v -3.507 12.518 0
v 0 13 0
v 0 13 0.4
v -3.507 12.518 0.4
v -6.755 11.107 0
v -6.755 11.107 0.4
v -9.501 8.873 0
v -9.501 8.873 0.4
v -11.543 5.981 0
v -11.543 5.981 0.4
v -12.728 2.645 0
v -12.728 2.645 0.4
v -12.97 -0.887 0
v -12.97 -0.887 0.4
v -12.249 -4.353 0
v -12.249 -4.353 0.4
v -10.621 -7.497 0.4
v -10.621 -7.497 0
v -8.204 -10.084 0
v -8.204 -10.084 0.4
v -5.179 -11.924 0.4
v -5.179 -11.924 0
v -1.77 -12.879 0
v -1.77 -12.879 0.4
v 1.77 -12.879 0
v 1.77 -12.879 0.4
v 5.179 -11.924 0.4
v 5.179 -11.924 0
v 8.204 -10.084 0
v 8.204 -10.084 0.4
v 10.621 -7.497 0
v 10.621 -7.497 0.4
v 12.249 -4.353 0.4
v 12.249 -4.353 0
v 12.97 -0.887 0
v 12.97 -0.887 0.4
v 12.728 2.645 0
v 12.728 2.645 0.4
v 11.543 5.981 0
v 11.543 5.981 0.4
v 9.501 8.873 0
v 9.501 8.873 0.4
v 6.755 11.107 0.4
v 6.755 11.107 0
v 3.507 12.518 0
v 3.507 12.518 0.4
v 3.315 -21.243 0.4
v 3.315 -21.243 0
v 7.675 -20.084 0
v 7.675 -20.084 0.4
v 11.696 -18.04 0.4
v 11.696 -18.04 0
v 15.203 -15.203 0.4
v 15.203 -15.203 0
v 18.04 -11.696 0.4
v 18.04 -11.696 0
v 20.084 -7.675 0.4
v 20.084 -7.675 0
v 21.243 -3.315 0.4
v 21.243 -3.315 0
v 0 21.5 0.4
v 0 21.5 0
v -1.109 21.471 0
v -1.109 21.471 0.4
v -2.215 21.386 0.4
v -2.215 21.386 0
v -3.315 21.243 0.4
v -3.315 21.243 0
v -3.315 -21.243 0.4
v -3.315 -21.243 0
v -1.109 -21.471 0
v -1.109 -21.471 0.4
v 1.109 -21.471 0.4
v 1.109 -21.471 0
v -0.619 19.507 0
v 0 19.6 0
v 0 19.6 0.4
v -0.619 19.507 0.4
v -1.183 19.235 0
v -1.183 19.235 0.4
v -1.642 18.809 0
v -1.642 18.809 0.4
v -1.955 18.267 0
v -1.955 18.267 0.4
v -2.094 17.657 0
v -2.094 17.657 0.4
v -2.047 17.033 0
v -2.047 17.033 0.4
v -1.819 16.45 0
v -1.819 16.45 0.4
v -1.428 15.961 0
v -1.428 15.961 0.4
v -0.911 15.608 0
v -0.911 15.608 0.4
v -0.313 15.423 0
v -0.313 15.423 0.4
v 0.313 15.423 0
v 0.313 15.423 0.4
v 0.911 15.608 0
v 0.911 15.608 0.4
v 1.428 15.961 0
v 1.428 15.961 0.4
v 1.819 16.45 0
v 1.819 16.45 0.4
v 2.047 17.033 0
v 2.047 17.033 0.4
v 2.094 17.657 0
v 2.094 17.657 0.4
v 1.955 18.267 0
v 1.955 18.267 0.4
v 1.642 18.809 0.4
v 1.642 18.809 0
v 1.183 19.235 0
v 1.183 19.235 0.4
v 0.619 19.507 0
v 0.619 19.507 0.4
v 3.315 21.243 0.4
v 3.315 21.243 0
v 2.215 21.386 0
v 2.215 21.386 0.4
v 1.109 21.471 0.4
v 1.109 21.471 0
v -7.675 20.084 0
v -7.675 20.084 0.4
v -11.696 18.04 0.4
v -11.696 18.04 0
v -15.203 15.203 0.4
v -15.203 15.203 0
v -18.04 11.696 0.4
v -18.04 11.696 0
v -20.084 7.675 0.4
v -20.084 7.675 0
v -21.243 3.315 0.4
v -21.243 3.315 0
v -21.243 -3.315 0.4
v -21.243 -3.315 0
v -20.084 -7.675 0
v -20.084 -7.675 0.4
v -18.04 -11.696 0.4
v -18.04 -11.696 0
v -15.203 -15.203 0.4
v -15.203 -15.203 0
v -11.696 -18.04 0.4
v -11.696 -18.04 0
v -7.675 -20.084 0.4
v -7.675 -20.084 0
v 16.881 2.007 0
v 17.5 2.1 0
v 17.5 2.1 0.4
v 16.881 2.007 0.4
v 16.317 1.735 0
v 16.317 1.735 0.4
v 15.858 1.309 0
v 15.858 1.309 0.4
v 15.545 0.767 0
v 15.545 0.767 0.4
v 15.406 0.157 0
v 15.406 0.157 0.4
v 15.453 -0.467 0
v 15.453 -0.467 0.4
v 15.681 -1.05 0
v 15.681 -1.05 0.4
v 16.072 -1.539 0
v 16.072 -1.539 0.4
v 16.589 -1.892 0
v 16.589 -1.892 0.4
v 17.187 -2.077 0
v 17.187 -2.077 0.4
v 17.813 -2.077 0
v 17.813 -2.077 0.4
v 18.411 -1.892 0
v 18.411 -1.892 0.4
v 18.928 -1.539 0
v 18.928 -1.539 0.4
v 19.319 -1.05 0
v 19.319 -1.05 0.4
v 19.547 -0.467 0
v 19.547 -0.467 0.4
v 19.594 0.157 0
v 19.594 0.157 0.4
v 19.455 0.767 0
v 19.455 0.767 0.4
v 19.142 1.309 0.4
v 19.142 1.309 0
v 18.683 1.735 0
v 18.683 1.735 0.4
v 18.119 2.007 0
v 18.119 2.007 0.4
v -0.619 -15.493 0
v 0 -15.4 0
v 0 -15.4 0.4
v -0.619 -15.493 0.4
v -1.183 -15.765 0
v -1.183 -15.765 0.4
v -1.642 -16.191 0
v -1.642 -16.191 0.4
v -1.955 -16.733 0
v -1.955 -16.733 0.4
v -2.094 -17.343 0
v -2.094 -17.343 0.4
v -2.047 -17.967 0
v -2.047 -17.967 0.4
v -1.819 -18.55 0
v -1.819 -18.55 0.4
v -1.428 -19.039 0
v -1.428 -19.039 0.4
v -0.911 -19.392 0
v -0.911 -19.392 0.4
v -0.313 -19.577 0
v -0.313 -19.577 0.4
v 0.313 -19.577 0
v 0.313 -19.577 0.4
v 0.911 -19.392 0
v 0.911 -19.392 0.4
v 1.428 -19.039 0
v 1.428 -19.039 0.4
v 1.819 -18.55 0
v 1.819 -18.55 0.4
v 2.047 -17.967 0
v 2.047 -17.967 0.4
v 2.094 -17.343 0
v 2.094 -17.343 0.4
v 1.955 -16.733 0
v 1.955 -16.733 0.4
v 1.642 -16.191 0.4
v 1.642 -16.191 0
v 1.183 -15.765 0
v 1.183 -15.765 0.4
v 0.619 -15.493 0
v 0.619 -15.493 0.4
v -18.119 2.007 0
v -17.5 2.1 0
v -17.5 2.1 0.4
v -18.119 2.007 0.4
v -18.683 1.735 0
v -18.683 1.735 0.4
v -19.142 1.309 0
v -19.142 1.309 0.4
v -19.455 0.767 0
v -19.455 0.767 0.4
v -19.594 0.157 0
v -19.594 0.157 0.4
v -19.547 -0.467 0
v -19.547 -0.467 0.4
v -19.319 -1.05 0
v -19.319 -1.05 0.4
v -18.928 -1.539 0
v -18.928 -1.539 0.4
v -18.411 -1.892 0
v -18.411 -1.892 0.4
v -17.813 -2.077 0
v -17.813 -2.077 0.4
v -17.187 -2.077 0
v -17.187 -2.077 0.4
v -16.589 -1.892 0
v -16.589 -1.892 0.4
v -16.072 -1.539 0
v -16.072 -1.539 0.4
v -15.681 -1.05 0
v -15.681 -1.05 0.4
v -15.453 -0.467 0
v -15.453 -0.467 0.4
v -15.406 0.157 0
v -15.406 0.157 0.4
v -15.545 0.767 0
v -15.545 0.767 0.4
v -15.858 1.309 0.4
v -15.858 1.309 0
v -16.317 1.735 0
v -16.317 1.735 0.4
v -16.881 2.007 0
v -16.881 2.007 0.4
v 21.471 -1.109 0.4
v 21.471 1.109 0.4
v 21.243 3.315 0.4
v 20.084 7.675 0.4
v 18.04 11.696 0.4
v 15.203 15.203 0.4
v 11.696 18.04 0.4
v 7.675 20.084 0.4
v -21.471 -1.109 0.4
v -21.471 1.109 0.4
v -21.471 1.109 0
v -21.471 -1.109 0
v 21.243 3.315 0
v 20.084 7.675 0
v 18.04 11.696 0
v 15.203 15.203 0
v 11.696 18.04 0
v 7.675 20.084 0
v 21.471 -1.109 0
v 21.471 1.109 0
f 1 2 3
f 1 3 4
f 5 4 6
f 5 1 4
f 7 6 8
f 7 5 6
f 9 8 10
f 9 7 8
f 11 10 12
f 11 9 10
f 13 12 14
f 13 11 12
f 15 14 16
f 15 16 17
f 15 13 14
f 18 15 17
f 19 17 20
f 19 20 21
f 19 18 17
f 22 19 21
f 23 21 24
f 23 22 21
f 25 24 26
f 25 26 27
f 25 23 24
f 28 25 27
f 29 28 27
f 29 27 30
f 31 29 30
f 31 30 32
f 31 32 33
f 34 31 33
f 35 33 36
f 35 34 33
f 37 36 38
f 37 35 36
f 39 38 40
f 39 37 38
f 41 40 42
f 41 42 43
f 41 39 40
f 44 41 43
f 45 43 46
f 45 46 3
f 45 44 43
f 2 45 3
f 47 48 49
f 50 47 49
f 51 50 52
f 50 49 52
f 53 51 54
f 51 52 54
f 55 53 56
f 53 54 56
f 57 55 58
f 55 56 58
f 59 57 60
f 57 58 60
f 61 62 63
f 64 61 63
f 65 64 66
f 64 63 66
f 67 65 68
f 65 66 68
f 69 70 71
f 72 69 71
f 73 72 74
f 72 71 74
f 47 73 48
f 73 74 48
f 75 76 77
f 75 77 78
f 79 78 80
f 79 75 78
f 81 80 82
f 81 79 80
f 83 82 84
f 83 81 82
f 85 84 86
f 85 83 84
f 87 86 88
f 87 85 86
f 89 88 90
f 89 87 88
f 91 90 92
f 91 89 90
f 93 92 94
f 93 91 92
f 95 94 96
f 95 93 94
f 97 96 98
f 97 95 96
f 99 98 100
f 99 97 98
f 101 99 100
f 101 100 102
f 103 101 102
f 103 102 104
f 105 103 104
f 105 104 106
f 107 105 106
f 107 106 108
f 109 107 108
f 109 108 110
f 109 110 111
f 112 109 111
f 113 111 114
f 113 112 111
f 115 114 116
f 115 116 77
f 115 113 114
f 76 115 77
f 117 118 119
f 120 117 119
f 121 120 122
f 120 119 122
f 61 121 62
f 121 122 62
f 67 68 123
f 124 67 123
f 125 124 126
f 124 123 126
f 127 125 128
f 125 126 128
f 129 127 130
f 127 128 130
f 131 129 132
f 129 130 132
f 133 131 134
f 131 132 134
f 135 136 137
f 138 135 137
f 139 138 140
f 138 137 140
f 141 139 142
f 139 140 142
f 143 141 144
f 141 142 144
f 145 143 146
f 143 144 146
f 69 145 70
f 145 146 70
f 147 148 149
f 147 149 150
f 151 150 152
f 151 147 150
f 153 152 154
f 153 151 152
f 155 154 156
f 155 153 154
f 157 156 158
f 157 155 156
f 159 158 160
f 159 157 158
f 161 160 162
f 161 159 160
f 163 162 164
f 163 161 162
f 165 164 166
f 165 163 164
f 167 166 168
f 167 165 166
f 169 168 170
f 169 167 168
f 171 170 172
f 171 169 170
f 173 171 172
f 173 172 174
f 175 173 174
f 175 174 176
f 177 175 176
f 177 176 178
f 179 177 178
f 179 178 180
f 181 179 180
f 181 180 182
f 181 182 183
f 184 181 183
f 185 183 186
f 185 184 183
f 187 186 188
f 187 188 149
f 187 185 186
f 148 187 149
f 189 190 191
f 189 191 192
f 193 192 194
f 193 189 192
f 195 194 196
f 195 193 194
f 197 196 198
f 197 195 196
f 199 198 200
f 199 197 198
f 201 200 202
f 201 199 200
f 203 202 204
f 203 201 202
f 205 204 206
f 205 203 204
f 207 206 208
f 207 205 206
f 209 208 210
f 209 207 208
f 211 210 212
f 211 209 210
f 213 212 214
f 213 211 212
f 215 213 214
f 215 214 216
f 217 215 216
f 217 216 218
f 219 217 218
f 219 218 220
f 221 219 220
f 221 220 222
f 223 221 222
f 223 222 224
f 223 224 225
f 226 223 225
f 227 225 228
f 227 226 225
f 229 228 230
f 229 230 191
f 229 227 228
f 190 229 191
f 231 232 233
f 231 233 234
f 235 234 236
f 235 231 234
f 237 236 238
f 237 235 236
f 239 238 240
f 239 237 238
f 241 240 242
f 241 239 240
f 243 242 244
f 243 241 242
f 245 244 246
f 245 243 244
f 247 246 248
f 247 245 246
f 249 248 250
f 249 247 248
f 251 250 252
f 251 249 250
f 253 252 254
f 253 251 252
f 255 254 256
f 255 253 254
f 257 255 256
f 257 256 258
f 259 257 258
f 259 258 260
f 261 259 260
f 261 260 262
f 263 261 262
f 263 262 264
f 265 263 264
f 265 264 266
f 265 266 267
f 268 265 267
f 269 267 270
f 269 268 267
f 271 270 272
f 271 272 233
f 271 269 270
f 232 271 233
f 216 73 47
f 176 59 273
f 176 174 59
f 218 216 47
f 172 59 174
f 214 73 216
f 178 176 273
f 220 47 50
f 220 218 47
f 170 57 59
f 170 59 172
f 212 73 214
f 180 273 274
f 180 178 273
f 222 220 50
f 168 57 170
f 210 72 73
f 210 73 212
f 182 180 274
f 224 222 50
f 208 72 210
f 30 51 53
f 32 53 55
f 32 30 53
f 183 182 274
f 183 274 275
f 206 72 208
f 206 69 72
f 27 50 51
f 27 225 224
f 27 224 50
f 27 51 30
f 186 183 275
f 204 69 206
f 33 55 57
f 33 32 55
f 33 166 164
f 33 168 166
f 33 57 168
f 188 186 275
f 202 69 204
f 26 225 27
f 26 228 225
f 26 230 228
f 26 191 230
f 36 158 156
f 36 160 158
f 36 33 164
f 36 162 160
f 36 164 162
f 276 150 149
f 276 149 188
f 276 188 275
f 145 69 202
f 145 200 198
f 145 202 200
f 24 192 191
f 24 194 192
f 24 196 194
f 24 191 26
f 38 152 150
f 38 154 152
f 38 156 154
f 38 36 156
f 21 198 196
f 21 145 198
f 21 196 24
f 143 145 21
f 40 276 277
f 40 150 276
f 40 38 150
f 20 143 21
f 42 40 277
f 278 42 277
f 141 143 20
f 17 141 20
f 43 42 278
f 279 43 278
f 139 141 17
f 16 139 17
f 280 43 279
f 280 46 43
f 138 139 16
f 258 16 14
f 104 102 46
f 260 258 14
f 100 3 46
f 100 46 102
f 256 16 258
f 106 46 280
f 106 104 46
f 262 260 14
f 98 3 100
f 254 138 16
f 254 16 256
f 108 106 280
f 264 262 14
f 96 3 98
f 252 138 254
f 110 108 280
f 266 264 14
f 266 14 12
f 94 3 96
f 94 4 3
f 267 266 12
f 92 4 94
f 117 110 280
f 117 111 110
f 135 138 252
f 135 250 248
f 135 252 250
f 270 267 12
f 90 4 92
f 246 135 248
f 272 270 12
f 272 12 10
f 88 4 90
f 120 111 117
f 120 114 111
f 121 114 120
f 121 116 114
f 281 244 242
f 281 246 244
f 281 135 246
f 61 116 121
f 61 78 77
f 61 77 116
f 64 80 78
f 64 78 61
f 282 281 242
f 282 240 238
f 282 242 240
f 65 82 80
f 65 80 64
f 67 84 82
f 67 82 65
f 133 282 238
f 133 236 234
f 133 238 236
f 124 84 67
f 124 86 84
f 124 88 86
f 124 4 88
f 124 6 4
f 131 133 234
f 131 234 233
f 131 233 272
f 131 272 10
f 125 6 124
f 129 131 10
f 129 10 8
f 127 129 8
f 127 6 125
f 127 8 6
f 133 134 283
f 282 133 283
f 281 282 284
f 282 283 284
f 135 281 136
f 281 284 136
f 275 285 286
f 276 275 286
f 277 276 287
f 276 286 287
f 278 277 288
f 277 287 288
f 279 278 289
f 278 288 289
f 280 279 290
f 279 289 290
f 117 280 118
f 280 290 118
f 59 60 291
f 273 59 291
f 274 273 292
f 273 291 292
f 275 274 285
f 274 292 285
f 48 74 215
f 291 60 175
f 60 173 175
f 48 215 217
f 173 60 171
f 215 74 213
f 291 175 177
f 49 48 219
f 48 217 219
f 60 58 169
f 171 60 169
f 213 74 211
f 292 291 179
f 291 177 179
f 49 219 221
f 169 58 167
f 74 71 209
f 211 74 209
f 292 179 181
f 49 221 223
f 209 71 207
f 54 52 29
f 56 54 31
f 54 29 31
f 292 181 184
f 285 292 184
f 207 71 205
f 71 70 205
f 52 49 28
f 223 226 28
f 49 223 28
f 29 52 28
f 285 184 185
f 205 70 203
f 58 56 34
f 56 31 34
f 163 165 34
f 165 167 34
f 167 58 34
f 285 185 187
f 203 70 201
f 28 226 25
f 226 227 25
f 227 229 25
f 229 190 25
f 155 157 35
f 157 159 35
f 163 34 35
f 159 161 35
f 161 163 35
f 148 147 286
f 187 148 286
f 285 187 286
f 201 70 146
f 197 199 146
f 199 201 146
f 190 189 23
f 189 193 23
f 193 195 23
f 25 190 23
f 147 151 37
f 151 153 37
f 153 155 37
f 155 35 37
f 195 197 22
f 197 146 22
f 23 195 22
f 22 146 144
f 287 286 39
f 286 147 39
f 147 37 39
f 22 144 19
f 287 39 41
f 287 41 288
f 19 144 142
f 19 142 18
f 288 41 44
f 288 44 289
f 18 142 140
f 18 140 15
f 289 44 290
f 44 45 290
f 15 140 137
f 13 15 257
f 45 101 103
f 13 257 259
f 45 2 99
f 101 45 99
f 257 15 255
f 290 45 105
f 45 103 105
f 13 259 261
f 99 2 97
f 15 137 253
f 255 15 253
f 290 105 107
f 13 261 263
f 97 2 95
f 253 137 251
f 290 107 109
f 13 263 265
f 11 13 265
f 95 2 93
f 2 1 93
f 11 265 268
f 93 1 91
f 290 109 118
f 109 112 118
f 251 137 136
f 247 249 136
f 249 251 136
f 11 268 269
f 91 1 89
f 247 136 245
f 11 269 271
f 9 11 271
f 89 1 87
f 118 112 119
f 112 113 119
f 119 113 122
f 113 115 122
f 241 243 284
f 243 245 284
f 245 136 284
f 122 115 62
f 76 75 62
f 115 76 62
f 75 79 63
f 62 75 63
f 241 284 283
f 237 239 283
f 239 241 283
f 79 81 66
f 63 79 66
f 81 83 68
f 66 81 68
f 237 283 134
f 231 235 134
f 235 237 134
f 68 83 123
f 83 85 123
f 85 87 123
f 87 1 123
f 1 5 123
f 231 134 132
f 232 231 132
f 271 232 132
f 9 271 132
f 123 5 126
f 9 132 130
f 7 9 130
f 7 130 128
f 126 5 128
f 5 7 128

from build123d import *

# Parameters (mm, degrees)
SKETCH1_R           = 2.1
SKETCH1_R_2         = 13
BOSS_EXTRUDE1_DEPTH = 0.4
BOSS_EXTRUDE2_DEPTH = 0.4


with BuildPart() as part:
    # Sketch1 → Boss-Extrude1 (new body)
    with BuildSketch(Plane(origin=(0, 0, 0), x_dir=(0, 1, 0), z_dir=(0, 0, 1))):
        with BuildLine():
            ThreePointArc((21.242857143, -3.31527079), (21.435617889, -1.662614121), (21.5, 0))
            ThreePointArc((21.5, 0), (21.435617889, 1.662614121), (21.242857143, 3.31527079))
            ThreePointArc((21.242857143, 3.31527079), (19.220493395, 4.694667451), (16.785714286, 4.948716593))
            ThreePointArc((16.785714286, 4.948716593), (12.374368671, 12.374368671), (4.948716593, 16.785714286))
            ThreePointArc((4.948716593, 16.785714286), (4.694667451, 19.220493395), (3.31527079, 21.242857143))
            ThreePointArc((3.31527079, 21.242857143), (0, 21.5), (-3.31527079, 21.242857143))
            ThreePointArc((-3.31527079, 21.242857143), (-4.694667451, 19.220493395), (-4.948716593, 16.785714286))
            ThreePointArc((-4.948716593, 16.785714286), (-12.374368671, 12.374368671), (-16.785714286, 4.948716593))
            ThreePointArc((-16.785714286, 4.948716593), (-19.220493395, 4.694667451), (-21.242857143, 3.31527079))
            ThreePointArc((-21.242857143, 3.31527079), (-21.5, 0), (-21.242857143, -3.31527079))
            ThreePointArc((-21.242857143, -3.31527079), (-19.220493395, -4.694667451), (-16.785714286, -4.948716593))
            ThreePointArc((-16.785714286, -4.948716593), (-12.374368671, -12.374368671), (-4.948716593, -16.785714286))
            ThreePointArc((-4.948716593, -16.785714286), (-4.694667451, -19.220493395), (-3.31527079, -21.242857143))
            ThreePointArc((-3.31527079, -21.242857143), (0, -21.5), (3.31527079, -21.242857143))
            ThreePointArc((3.31527079, -21.242857143), (4.694667451, -19.220493395), (4.948716593, -16.785714286))
            ThreePointArc((4.948716593, -16.785714286), (12.374368671, -12.374368671), (16.785714286, -4.948716593))
            ThreePointArc((16.785714286, -4.948716593), (19.220493395, -4.694667451), (21.242857143, -3.31527079))
        make_face()
        with Locations((0, -17.5)):
            Circle(SKETCH1_R, mode=Mode.SUBTRACT)
        Circle(SKETCH1_R_2, mode=Mode.SUBTRACT)
        with Locations((17.5, 0)):
            Circle(SKETCH1_R, mode=Mode.SUBTRACT)
        with Locations((-17.5, 0)):
            Circle(SKETCH1_R, mode=Mode.SUBTRACT)
        with Locations((0, 17.5)):
            Circle(SKETCH1_R, mode=Mode.SUBTRACT)
    extrude(amount=BOSS_EXTRUDE1_DEPTH)

    # Sketch1_4 → Boss-Extrude2 (add)
    with BuildSketch(Plane(origin=(0, 0, 0), x_dir=(0, 1, 0), z_dir=(0, 0, 1))):
        with BuildLine():
            ThreePointArc((-21.242857143, -3.31527079), (-15.202795796, -15.202795796), (-3.31527079, -21.242857143))
            ThreePointArc((-3.31527079, -21.242857143), (-4.694667451, -19.220493395), (-4.948716593, -16.785714286))
            ThreePointArc((-4.948716593, -16.785714286), (-12.374368671, -12.374368671), (-16.785714286, -4.948716593))
            ThreePointArc((-16.785714286, -4.948716593), (-19.220493395, -4.694667451), (-21.242857143, -3.31527079))
        make_face()
        with BuildLine():
            ThreePointArc((-4.948716593, 16.785714286), (-4.694667451, 19.220493395), (-3.31527079, 21.242857143))
            ThreePointArc((-3.31527079, 21.242857143), (-15.202795796, 15.202795796), (-21.242857143, 3.31527079))
            ThreePointArc((-21.242857143, 3.31527079), (-19.220493395, 4.694667451), (-16.785714286, 4.948716593))
            ThreePointArc((-16.785714286, 4.948716593), (-12.374368671, 12.374368671), (-4.948716593, 16.785714286))
        make_face()
        with BuildLine():
            ThreePointArc((16.785714286, 4.948716593), (19.220493395, 4.694667451), (21.242857143, 3.31527079))
            ThreePointArc((21.242857143, 3.31527079), (15.202795796, 15.202795796), (3.31527079, 21.242857143))
            ThreePointArc((3.31527079, 21.242857143), (4.694667451, 19.220493395), (4.948716593, 16.785714286))
            ThreePointArc((4.948716593, 16.785714286), (12.374368671, 12.374368671), (16.785714286, 4.948716593))
        make_face()
        with BuildLine():
            ThreePointArc((3.31527079, -21.242857143), (15.202795796, -15.202795796), (21.242857143, -3.31527079))
            ThreePointArc((21.242857143, -3.31527079), (19.220493395, -4.694667451), (16.785714286, -4.948716593))
            ThreePointArc((16.785714286, -4.948716593), (12.374368671, -12.374368671), (4.948716593, -16.785714286))
            ThreePointArc((4.948716593, -16.785714286), (4.694667451, -19.220493395), (3.31527079, -21.242857143))
        make_face()
    extrude(amount=BOSS_EXTRUDE2_DEPTH)


solid = part.part
